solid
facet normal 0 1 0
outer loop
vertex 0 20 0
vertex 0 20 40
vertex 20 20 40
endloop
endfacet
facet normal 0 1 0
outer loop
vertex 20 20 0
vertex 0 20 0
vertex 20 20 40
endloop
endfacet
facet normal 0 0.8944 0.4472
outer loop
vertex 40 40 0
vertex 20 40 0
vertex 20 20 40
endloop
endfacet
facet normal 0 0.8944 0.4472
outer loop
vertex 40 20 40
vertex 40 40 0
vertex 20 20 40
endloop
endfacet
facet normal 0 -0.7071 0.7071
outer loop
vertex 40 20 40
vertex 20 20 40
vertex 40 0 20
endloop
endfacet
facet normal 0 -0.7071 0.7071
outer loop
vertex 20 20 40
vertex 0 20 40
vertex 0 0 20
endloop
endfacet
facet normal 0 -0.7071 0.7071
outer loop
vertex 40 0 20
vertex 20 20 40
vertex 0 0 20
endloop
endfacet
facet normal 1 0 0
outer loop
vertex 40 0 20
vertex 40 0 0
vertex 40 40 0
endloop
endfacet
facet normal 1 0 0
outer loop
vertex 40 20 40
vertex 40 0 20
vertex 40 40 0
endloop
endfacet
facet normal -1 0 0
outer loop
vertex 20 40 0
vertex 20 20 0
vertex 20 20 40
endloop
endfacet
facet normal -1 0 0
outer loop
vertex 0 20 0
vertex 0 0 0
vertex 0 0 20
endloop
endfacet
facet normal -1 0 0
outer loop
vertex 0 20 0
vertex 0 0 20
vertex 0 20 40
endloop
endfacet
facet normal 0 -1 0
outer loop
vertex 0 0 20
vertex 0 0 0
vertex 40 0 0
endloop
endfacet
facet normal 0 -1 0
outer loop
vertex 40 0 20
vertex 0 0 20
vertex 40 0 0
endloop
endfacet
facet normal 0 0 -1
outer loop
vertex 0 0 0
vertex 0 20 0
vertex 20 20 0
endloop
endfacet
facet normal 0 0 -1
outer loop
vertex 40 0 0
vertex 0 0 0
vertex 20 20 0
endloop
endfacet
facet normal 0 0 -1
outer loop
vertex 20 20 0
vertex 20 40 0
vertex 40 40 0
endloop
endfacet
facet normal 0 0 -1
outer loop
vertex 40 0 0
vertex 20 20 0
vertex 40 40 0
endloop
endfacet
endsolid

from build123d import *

# Parameters (mm, degrees)
SKETCH1_W           = 40
SKETCH1_H           = 40
BOSS_EXTRUDE1_DEPTH = 40
SKETCH2_W           = 20
SKETCH2_H           = 20
CUT_EXTRUDE1_DEPTH  = 40
CUT_EXTRUDE2_DEPTH  = 40
CUT_EXTRUDE3_DEPTH  = 40


with BuildPart() as part:
    # Sketch1 → Boss-Extrude1 (new body)
    with BuildSketch(Plane.XY):
        with Locations((20, 20)):
            Rectangle(SKETCH1_W, SKETCH1_H)
    extrude(amount=BOSS_EXTRUDE1_DEPTH)

    # Sketch2 → Cut-Extrude1 (cut)
    with BuildSketch(Plane.XY.offset(40)):
        with Locations((10, 30)):
            Rectangle(SKETCH2_W, SKETCH2_H)
    extrude(amount=-CUT_EXTRUDE1_DEPTH, mode=Mode.SUBTRACT)

    # Sketch3 → Cut-Extrude2 (cut)
    with BuildSketch(Plane.ZY.offset(-20)):
        Polygon((0, 40), (40, 20), (40, 40), align=None)
    extrude(amount=-CUT_EXTRUDE2_DEPTH, mode=Mode.SUBTRACT)

    # Sketch4 → Cut-Extrude3 (cut)
    with BuildSketch(Plane.ZY):
        Polygon((40, 20), (20, 0), (40, 0), align=None)
    extrude(amount=-CUT_EXTRUDE3_DEPTH, mode=Mode.SUBTRACT)


solid = part.part
